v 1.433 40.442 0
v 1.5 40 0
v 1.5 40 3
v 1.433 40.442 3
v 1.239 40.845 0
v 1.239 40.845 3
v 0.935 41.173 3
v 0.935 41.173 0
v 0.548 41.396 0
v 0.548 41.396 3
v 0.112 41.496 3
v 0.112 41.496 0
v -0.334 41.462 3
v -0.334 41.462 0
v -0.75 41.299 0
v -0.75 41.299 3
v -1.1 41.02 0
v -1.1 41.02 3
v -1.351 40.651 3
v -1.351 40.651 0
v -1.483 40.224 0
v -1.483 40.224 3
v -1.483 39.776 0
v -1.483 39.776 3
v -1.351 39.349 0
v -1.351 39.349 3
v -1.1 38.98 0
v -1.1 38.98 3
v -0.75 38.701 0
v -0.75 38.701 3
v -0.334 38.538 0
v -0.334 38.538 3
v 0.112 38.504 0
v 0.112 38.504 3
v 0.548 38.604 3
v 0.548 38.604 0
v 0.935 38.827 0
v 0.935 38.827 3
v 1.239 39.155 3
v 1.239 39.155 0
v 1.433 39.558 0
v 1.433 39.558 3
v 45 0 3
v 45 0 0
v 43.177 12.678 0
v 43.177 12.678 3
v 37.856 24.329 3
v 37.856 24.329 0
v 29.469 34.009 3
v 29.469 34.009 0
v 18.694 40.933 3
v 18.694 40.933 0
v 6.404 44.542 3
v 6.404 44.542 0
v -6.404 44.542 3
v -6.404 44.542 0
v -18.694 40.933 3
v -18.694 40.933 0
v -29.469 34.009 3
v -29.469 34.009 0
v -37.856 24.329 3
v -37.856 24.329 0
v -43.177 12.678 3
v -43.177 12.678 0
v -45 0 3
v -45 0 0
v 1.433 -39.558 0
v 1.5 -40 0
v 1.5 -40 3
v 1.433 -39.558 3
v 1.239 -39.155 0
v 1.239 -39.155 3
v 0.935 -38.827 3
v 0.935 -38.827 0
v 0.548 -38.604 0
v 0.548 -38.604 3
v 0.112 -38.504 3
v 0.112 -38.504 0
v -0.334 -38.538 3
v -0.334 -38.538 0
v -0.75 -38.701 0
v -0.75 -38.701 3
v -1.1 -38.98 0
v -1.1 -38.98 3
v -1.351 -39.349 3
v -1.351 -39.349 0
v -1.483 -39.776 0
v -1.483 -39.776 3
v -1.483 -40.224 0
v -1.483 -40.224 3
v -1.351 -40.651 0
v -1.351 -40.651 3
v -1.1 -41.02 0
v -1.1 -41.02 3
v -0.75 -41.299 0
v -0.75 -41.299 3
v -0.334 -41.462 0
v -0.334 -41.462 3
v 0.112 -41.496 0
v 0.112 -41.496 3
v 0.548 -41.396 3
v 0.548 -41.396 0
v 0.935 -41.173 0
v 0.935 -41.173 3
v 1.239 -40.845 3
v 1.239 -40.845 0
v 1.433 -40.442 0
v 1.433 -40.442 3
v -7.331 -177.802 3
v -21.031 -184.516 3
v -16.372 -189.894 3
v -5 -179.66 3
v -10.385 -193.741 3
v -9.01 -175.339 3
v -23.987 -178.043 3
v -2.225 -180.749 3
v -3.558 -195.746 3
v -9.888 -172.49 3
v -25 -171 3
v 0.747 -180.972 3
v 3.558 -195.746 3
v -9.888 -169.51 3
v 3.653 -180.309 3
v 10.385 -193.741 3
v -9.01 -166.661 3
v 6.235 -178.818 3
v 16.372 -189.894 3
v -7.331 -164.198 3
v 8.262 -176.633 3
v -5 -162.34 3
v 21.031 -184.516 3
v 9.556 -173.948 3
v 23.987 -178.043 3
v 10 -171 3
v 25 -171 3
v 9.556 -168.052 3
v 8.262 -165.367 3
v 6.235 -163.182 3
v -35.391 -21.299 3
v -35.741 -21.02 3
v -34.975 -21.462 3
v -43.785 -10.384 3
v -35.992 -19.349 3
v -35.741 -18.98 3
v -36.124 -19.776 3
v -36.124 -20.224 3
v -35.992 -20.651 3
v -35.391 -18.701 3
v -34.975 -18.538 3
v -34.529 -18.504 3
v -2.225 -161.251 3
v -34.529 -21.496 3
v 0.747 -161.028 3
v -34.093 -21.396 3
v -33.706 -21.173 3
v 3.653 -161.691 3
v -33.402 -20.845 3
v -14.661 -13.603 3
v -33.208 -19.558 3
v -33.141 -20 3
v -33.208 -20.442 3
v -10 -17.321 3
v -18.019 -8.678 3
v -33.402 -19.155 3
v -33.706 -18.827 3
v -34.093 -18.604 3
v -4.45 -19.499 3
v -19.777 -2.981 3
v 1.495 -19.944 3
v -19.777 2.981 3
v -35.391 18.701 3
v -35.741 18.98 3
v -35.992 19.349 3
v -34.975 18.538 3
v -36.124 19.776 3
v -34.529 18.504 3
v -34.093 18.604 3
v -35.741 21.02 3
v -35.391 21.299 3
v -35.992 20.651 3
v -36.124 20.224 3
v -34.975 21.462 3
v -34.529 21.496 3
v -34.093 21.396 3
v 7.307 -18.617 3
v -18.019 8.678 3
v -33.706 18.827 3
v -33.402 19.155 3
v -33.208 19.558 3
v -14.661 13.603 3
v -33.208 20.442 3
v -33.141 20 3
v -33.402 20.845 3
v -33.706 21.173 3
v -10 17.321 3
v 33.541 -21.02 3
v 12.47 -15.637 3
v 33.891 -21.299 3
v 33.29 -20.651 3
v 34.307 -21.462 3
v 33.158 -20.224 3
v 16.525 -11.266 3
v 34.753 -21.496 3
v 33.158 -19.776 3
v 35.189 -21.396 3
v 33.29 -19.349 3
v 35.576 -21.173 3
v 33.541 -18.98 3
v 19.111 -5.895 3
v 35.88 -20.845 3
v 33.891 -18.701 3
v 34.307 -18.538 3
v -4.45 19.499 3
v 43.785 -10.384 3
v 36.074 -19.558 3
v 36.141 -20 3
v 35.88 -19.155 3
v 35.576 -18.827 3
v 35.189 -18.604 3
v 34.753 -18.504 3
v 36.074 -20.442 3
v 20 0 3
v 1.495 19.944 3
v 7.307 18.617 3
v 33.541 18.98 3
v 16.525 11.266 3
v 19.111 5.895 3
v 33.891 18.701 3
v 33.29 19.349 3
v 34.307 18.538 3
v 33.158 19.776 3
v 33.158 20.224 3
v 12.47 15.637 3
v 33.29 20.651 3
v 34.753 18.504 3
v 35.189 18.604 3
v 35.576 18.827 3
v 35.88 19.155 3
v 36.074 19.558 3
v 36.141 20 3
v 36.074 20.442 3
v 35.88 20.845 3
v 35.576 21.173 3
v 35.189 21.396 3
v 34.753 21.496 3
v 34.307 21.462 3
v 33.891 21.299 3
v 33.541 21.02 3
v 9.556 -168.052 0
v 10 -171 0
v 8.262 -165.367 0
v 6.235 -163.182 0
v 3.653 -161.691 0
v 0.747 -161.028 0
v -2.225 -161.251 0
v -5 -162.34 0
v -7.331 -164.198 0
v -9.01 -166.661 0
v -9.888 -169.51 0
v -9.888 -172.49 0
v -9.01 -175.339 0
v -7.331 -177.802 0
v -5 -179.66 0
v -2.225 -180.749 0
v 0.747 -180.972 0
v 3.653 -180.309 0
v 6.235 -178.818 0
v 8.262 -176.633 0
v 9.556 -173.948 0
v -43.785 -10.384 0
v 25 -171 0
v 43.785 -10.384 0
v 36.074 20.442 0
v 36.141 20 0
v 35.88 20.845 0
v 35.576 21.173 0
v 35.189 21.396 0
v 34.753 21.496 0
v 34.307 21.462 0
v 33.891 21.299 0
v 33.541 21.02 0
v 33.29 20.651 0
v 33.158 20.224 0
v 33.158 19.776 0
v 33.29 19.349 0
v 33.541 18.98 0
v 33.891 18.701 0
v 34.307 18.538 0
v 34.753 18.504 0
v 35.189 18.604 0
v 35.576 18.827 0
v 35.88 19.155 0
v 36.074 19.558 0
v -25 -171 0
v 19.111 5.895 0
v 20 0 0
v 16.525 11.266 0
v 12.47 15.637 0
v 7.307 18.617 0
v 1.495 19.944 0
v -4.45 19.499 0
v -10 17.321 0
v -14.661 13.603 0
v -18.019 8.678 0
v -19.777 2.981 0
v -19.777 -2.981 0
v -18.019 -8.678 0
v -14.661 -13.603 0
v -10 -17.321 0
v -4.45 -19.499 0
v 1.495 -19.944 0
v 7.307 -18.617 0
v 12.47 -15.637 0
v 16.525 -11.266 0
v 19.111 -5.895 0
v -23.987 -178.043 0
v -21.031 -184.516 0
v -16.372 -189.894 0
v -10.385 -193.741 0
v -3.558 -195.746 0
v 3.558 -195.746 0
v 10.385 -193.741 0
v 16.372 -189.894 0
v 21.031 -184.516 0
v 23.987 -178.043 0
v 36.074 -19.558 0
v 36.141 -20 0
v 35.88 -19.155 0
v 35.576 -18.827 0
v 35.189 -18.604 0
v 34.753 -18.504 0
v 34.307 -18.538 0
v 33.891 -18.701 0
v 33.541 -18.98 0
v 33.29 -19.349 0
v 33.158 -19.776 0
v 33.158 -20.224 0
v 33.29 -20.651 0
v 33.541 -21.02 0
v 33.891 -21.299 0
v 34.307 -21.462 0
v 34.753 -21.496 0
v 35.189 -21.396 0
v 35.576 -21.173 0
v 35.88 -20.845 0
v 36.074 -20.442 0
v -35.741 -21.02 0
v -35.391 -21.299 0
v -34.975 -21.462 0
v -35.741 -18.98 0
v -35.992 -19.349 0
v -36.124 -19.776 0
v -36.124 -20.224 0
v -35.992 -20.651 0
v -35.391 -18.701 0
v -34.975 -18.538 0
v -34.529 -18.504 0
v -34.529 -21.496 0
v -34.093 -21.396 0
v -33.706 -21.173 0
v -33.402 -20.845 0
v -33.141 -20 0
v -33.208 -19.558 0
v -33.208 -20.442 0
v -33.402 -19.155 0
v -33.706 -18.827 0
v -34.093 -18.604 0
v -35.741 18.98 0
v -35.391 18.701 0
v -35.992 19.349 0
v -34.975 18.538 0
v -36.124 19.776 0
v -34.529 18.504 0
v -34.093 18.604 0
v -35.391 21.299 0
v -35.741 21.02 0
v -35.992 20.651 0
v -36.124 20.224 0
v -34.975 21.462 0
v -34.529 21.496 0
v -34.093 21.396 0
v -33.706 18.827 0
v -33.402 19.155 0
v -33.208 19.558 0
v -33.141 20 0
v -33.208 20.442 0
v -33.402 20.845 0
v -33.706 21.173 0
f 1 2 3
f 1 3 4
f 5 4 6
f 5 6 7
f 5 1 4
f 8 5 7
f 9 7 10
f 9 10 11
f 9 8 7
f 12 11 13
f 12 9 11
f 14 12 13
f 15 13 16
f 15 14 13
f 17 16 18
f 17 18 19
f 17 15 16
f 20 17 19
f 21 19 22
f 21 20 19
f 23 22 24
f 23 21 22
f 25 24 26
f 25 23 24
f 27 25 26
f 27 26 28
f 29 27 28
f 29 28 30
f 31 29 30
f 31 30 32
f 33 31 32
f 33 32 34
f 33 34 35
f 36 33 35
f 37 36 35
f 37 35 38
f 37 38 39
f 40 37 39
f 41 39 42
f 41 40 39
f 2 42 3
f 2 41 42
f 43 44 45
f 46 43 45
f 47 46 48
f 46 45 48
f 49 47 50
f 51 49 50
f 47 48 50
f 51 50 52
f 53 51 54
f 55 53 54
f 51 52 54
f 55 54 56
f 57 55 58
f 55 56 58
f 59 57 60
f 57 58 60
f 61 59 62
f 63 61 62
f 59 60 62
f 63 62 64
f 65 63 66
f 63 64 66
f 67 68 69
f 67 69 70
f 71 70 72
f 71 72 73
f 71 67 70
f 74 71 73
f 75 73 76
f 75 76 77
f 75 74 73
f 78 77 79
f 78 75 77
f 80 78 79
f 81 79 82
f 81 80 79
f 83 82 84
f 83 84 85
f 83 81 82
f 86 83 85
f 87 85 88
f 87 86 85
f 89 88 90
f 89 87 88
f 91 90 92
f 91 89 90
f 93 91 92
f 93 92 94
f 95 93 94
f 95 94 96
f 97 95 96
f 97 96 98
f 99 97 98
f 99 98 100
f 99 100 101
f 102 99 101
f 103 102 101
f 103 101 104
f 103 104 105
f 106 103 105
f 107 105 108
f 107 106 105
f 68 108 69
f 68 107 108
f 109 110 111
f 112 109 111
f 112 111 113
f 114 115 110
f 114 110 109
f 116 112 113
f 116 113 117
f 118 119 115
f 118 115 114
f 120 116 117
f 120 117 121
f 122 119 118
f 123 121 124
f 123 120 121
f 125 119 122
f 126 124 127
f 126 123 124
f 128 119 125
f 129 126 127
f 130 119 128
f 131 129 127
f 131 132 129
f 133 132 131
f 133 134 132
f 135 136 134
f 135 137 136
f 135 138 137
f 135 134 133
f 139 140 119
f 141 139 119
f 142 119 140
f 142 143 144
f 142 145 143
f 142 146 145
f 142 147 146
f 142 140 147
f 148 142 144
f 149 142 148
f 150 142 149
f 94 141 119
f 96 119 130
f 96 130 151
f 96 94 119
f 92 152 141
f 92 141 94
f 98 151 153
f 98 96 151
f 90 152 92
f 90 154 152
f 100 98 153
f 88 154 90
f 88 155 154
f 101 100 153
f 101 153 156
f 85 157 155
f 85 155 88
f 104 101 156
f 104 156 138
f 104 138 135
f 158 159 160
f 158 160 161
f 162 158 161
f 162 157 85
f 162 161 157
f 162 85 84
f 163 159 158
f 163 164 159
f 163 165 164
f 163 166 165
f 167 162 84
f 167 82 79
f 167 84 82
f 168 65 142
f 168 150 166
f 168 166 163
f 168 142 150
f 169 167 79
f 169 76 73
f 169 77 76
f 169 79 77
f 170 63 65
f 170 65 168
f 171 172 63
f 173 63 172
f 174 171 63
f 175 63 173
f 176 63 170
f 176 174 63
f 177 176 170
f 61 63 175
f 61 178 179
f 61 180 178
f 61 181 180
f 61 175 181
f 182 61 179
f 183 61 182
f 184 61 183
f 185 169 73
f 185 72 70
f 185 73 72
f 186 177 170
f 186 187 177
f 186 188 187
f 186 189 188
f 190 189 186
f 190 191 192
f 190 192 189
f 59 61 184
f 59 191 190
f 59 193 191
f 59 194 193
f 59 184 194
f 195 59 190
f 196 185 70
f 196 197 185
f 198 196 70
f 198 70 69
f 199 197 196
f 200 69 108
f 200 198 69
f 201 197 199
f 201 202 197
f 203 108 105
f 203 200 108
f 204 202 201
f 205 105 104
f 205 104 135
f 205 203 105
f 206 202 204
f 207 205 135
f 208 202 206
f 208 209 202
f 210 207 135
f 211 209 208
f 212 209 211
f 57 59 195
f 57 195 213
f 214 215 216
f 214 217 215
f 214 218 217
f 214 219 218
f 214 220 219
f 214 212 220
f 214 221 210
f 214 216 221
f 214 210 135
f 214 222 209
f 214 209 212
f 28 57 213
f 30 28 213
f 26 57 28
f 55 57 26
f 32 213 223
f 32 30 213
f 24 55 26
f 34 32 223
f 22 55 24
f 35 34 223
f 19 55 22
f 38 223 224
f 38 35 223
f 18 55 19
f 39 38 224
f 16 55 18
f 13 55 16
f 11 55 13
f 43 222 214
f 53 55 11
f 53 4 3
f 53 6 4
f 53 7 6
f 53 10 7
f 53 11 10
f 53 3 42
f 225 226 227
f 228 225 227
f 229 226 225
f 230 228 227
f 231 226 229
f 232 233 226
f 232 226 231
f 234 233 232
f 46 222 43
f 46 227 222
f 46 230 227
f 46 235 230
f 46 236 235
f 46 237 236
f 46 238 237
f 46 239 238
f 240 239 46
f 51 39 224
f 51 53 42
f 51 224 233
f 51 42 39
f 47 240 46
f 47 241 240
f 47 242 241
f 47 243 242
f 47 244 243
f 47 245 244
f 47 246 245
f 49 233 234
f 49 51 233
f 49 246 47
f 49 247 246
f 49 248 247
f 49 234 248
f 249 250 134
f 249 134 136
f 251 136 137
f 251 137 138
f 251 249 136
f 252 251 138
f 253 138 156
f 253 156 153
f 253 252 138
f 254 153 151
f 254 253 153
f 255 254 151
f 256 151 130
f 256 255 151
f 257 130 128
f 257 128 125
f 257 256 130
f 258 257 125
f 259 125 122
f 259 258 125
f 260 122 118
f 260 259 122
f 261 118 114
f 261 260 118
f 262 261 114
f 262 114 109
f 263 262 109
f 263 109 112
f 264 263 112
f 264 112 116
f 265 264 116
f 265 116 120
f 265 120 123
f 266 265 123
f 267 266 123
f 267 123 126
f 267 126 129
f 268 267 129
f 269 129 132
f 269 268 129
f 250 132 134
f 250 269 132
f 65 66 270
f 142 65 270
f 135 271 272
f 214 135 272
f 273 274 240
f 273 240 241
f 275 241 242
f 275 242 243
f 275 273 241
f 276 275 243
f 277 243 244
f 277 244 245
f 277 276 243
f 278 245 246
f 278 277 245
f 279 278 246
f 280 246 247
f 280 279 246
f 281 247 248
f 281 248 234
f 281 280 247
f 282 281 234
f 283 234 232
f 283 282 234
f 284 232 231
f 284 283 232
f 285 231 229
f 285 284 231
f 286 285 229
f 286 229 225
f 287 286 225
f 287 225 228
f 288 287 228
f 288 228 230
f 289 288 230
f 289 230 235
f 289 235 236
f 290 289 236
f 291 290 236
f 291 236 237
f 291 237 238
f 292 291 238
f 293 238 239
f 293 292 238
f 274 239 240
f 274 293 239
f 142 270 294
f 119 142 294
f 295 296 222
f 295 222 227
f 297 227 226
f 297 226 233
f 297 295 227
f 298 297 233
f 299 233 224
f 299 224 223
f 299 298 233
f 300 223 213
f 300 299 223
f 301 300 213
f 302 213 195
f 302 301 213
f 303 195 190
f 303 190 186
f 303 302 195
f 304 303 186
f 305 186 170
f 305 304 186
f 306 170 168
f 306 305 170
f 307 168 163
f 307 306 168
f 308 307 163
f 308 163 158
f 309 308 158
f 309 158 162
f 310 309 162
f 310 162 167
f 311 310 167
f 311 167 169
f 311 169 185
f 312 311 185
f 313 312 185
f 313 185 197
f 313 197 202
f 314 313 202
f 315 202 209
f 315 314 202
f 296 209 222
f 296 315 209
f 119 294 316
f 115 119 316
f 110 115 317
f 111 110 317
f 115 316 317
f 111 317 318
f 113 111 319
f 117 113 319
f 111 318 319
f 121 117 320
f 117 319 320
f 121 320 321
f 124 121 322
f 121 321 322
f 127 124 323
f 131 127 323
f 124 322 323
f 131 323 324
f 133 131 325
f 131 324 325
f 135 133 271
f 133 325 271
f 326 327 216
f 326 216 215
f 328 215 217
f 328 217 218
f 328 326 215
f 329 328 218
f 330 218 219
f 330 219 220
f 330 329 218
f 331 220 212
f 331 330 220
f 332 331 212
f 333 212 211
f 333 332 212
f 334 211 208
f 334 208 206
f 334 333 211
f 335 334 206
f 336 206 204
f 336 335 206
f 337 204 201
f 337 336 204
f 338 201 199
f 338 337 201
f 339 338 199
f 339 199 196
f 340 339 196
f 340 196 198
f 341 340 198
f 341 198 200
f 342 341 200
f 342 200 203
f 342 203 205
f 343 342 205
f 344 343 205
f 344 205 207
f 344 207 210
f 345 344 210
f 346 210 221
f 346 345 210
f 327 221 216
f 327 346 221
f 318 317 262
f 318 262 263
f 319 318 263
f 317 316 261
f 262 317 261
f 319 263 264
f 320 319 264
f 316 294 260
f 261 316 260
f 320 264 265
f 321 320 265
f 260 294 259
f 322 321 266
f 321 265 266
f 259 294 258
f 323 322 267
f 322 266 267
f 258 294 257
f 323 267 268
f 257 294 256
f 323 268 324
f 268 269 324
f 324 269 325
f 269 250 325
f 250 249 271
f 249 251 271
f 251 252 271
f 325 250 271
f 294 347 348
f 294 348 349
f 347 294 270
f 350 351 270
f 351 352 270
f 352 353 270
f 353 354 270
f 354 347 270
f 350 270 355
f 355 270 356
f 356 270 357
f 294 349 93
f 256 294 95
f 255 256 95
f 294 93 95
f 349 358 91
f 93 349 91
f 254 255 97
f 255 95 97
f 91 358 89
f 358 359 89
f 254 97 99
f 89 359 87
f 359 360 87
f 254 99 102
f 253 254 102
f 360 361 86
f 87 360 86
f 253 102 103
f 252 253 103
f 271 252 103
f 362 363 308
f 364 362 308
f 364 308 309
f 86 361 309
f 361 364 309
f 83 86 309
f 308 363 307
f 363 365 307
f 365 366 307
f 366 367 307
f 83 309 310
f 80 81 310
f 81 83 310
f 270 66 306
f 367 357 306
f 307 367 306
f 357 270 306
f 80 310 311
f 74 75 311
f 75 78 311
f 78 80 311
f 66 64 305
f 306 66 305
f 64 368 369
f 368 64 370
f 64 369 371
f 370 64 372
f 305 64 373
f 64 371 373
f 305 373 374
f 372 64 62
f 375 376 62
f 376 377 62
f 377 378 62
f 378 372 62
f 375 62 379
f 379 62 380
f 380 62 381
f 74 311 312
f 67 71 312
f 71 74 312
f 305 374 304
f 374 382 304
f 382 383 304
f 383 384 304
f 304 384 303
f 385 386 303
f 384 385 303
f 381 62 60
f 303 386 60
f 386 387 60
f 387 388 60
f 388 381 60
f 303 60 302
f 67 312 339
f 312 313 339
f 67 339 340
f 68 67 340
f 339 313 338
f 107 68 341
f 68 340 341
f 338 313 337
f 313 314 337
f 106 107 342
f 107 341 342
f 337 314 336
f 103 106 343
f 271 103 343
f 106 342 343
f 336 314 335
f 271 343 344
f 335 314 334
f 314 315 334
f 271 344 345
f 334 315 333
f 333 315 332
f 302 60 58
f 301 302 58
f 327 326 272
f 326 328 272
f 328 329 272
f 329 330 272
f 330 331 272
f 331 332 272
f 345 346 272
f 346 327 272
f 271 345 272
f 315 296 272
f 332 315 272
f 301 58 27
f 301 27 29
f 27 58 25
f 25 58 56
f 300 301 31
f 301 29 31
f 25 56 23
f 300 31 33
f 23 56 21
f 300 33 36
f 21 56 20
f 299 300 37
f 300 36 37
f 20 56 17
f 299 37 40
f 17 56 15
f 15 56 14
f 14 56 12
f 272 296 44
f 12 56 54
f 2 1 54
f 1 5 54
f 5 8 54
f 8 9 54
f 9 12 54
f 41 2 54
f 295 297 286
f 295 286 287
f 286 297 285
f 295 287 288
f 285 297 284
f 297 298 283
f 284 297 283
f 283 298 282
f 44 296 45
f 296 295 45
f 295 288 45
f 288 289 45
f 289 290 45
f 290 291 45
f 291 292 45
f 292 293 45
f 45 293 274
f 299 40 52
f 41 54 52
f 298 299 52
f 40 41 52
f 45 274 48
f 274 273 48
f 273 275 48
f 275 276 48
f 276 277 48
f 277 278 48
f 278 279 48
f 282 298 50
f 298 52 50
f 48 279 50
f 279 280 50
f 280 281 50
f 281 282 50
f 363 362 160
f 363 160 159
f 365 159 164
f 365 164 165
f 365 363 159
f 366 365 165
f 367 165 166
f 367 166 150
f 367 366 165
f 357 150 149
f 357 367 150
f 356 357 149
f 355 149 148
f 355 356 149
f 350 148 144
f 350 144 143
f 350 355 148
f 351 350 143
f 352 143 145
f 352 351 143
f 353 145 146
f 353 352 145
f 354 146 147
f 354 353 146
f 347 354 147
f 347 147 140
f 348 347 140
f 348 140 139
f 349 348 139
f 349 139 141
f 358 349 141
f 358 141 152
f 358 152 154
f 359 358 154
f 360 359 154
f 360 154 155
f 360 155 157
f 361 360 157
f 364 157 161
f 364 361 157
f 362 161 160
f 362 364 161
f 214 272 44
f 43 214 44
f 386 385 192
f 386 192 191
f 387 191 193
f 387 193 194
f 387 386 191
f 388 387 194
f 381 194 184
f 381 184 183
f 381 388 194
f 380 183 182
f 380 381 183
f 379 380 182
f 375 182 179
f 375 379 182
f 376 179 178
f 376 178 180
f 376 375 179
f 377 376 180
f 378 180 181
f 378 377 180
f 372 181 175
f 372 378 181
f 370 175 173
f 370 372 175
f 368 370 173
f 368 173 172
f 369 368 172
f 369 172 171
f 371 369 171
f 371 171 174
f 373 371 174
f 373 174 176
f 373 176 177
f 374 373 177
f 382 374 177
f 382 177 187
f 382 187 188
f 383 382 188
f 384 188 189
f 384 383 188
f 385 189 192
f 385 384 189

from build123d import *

# Parameters (mm, degrees)
SKETCH1_R           = 10
SKETCH1_R_2         = 1.5
SKETCH1_R_3         = 20
BOSS_EXTRUDE1_DEPTH = 3


with BuildPart() as part:
    # Sketch1 → Boss-Extrude1 (new body)
    with BuildSketch(Plane.XY):
        with BuildLine():
            ThreePointArc((45, 0), (0, 45), (-45, 0))
            Line((-45, 0), (-43.785466077, -10.384265038))
            Line((-43.785466077, -10.384265038), (-25, -171))
            ThreePointArc((-25, -171), (0, -196), (25, -171))
            Line((25, -171), (43.785466077, -10.384265038))
            Line((43.785466077, -10.384265038), (45, 0))
        make_face()
        with Locations((0, -171)):
            Circle(SKETCH1_R, mode=Mode.SUBTRACT)
        with Locations((-34.641016151, -20)):
            Circle(SKETCH1_R_2, mode=Mode.SUBTRACT)
        with Locations((0, -40)):
            Circle(SKETCH1_R_2, mode=Mode.SUBTRACT)
        with Locations((-34.641016151, 20)):
            Circle(SKETCH1_R_2, mode=Mode.SUBTRACT)
        Circle(SKETCH1_R_3, mode=Mode.SUBTRACT)
        with Locations((0, 40)):
            Circle(SKETCH1_R_2, mode=Mode.SUBTRACT)
        with Locations((34.641016151, -20)):
            Circle(SKETCH1_R_2, mode=Mode.SUBTRACT)
        with Locations((34.641016151, 20)):
            Circle(SKETCH1_R_2, mode=Mode.SUBTRACT)
    extrude(amount=BOSS_EXTRUDE1_DEPTH)


solid = part.part
